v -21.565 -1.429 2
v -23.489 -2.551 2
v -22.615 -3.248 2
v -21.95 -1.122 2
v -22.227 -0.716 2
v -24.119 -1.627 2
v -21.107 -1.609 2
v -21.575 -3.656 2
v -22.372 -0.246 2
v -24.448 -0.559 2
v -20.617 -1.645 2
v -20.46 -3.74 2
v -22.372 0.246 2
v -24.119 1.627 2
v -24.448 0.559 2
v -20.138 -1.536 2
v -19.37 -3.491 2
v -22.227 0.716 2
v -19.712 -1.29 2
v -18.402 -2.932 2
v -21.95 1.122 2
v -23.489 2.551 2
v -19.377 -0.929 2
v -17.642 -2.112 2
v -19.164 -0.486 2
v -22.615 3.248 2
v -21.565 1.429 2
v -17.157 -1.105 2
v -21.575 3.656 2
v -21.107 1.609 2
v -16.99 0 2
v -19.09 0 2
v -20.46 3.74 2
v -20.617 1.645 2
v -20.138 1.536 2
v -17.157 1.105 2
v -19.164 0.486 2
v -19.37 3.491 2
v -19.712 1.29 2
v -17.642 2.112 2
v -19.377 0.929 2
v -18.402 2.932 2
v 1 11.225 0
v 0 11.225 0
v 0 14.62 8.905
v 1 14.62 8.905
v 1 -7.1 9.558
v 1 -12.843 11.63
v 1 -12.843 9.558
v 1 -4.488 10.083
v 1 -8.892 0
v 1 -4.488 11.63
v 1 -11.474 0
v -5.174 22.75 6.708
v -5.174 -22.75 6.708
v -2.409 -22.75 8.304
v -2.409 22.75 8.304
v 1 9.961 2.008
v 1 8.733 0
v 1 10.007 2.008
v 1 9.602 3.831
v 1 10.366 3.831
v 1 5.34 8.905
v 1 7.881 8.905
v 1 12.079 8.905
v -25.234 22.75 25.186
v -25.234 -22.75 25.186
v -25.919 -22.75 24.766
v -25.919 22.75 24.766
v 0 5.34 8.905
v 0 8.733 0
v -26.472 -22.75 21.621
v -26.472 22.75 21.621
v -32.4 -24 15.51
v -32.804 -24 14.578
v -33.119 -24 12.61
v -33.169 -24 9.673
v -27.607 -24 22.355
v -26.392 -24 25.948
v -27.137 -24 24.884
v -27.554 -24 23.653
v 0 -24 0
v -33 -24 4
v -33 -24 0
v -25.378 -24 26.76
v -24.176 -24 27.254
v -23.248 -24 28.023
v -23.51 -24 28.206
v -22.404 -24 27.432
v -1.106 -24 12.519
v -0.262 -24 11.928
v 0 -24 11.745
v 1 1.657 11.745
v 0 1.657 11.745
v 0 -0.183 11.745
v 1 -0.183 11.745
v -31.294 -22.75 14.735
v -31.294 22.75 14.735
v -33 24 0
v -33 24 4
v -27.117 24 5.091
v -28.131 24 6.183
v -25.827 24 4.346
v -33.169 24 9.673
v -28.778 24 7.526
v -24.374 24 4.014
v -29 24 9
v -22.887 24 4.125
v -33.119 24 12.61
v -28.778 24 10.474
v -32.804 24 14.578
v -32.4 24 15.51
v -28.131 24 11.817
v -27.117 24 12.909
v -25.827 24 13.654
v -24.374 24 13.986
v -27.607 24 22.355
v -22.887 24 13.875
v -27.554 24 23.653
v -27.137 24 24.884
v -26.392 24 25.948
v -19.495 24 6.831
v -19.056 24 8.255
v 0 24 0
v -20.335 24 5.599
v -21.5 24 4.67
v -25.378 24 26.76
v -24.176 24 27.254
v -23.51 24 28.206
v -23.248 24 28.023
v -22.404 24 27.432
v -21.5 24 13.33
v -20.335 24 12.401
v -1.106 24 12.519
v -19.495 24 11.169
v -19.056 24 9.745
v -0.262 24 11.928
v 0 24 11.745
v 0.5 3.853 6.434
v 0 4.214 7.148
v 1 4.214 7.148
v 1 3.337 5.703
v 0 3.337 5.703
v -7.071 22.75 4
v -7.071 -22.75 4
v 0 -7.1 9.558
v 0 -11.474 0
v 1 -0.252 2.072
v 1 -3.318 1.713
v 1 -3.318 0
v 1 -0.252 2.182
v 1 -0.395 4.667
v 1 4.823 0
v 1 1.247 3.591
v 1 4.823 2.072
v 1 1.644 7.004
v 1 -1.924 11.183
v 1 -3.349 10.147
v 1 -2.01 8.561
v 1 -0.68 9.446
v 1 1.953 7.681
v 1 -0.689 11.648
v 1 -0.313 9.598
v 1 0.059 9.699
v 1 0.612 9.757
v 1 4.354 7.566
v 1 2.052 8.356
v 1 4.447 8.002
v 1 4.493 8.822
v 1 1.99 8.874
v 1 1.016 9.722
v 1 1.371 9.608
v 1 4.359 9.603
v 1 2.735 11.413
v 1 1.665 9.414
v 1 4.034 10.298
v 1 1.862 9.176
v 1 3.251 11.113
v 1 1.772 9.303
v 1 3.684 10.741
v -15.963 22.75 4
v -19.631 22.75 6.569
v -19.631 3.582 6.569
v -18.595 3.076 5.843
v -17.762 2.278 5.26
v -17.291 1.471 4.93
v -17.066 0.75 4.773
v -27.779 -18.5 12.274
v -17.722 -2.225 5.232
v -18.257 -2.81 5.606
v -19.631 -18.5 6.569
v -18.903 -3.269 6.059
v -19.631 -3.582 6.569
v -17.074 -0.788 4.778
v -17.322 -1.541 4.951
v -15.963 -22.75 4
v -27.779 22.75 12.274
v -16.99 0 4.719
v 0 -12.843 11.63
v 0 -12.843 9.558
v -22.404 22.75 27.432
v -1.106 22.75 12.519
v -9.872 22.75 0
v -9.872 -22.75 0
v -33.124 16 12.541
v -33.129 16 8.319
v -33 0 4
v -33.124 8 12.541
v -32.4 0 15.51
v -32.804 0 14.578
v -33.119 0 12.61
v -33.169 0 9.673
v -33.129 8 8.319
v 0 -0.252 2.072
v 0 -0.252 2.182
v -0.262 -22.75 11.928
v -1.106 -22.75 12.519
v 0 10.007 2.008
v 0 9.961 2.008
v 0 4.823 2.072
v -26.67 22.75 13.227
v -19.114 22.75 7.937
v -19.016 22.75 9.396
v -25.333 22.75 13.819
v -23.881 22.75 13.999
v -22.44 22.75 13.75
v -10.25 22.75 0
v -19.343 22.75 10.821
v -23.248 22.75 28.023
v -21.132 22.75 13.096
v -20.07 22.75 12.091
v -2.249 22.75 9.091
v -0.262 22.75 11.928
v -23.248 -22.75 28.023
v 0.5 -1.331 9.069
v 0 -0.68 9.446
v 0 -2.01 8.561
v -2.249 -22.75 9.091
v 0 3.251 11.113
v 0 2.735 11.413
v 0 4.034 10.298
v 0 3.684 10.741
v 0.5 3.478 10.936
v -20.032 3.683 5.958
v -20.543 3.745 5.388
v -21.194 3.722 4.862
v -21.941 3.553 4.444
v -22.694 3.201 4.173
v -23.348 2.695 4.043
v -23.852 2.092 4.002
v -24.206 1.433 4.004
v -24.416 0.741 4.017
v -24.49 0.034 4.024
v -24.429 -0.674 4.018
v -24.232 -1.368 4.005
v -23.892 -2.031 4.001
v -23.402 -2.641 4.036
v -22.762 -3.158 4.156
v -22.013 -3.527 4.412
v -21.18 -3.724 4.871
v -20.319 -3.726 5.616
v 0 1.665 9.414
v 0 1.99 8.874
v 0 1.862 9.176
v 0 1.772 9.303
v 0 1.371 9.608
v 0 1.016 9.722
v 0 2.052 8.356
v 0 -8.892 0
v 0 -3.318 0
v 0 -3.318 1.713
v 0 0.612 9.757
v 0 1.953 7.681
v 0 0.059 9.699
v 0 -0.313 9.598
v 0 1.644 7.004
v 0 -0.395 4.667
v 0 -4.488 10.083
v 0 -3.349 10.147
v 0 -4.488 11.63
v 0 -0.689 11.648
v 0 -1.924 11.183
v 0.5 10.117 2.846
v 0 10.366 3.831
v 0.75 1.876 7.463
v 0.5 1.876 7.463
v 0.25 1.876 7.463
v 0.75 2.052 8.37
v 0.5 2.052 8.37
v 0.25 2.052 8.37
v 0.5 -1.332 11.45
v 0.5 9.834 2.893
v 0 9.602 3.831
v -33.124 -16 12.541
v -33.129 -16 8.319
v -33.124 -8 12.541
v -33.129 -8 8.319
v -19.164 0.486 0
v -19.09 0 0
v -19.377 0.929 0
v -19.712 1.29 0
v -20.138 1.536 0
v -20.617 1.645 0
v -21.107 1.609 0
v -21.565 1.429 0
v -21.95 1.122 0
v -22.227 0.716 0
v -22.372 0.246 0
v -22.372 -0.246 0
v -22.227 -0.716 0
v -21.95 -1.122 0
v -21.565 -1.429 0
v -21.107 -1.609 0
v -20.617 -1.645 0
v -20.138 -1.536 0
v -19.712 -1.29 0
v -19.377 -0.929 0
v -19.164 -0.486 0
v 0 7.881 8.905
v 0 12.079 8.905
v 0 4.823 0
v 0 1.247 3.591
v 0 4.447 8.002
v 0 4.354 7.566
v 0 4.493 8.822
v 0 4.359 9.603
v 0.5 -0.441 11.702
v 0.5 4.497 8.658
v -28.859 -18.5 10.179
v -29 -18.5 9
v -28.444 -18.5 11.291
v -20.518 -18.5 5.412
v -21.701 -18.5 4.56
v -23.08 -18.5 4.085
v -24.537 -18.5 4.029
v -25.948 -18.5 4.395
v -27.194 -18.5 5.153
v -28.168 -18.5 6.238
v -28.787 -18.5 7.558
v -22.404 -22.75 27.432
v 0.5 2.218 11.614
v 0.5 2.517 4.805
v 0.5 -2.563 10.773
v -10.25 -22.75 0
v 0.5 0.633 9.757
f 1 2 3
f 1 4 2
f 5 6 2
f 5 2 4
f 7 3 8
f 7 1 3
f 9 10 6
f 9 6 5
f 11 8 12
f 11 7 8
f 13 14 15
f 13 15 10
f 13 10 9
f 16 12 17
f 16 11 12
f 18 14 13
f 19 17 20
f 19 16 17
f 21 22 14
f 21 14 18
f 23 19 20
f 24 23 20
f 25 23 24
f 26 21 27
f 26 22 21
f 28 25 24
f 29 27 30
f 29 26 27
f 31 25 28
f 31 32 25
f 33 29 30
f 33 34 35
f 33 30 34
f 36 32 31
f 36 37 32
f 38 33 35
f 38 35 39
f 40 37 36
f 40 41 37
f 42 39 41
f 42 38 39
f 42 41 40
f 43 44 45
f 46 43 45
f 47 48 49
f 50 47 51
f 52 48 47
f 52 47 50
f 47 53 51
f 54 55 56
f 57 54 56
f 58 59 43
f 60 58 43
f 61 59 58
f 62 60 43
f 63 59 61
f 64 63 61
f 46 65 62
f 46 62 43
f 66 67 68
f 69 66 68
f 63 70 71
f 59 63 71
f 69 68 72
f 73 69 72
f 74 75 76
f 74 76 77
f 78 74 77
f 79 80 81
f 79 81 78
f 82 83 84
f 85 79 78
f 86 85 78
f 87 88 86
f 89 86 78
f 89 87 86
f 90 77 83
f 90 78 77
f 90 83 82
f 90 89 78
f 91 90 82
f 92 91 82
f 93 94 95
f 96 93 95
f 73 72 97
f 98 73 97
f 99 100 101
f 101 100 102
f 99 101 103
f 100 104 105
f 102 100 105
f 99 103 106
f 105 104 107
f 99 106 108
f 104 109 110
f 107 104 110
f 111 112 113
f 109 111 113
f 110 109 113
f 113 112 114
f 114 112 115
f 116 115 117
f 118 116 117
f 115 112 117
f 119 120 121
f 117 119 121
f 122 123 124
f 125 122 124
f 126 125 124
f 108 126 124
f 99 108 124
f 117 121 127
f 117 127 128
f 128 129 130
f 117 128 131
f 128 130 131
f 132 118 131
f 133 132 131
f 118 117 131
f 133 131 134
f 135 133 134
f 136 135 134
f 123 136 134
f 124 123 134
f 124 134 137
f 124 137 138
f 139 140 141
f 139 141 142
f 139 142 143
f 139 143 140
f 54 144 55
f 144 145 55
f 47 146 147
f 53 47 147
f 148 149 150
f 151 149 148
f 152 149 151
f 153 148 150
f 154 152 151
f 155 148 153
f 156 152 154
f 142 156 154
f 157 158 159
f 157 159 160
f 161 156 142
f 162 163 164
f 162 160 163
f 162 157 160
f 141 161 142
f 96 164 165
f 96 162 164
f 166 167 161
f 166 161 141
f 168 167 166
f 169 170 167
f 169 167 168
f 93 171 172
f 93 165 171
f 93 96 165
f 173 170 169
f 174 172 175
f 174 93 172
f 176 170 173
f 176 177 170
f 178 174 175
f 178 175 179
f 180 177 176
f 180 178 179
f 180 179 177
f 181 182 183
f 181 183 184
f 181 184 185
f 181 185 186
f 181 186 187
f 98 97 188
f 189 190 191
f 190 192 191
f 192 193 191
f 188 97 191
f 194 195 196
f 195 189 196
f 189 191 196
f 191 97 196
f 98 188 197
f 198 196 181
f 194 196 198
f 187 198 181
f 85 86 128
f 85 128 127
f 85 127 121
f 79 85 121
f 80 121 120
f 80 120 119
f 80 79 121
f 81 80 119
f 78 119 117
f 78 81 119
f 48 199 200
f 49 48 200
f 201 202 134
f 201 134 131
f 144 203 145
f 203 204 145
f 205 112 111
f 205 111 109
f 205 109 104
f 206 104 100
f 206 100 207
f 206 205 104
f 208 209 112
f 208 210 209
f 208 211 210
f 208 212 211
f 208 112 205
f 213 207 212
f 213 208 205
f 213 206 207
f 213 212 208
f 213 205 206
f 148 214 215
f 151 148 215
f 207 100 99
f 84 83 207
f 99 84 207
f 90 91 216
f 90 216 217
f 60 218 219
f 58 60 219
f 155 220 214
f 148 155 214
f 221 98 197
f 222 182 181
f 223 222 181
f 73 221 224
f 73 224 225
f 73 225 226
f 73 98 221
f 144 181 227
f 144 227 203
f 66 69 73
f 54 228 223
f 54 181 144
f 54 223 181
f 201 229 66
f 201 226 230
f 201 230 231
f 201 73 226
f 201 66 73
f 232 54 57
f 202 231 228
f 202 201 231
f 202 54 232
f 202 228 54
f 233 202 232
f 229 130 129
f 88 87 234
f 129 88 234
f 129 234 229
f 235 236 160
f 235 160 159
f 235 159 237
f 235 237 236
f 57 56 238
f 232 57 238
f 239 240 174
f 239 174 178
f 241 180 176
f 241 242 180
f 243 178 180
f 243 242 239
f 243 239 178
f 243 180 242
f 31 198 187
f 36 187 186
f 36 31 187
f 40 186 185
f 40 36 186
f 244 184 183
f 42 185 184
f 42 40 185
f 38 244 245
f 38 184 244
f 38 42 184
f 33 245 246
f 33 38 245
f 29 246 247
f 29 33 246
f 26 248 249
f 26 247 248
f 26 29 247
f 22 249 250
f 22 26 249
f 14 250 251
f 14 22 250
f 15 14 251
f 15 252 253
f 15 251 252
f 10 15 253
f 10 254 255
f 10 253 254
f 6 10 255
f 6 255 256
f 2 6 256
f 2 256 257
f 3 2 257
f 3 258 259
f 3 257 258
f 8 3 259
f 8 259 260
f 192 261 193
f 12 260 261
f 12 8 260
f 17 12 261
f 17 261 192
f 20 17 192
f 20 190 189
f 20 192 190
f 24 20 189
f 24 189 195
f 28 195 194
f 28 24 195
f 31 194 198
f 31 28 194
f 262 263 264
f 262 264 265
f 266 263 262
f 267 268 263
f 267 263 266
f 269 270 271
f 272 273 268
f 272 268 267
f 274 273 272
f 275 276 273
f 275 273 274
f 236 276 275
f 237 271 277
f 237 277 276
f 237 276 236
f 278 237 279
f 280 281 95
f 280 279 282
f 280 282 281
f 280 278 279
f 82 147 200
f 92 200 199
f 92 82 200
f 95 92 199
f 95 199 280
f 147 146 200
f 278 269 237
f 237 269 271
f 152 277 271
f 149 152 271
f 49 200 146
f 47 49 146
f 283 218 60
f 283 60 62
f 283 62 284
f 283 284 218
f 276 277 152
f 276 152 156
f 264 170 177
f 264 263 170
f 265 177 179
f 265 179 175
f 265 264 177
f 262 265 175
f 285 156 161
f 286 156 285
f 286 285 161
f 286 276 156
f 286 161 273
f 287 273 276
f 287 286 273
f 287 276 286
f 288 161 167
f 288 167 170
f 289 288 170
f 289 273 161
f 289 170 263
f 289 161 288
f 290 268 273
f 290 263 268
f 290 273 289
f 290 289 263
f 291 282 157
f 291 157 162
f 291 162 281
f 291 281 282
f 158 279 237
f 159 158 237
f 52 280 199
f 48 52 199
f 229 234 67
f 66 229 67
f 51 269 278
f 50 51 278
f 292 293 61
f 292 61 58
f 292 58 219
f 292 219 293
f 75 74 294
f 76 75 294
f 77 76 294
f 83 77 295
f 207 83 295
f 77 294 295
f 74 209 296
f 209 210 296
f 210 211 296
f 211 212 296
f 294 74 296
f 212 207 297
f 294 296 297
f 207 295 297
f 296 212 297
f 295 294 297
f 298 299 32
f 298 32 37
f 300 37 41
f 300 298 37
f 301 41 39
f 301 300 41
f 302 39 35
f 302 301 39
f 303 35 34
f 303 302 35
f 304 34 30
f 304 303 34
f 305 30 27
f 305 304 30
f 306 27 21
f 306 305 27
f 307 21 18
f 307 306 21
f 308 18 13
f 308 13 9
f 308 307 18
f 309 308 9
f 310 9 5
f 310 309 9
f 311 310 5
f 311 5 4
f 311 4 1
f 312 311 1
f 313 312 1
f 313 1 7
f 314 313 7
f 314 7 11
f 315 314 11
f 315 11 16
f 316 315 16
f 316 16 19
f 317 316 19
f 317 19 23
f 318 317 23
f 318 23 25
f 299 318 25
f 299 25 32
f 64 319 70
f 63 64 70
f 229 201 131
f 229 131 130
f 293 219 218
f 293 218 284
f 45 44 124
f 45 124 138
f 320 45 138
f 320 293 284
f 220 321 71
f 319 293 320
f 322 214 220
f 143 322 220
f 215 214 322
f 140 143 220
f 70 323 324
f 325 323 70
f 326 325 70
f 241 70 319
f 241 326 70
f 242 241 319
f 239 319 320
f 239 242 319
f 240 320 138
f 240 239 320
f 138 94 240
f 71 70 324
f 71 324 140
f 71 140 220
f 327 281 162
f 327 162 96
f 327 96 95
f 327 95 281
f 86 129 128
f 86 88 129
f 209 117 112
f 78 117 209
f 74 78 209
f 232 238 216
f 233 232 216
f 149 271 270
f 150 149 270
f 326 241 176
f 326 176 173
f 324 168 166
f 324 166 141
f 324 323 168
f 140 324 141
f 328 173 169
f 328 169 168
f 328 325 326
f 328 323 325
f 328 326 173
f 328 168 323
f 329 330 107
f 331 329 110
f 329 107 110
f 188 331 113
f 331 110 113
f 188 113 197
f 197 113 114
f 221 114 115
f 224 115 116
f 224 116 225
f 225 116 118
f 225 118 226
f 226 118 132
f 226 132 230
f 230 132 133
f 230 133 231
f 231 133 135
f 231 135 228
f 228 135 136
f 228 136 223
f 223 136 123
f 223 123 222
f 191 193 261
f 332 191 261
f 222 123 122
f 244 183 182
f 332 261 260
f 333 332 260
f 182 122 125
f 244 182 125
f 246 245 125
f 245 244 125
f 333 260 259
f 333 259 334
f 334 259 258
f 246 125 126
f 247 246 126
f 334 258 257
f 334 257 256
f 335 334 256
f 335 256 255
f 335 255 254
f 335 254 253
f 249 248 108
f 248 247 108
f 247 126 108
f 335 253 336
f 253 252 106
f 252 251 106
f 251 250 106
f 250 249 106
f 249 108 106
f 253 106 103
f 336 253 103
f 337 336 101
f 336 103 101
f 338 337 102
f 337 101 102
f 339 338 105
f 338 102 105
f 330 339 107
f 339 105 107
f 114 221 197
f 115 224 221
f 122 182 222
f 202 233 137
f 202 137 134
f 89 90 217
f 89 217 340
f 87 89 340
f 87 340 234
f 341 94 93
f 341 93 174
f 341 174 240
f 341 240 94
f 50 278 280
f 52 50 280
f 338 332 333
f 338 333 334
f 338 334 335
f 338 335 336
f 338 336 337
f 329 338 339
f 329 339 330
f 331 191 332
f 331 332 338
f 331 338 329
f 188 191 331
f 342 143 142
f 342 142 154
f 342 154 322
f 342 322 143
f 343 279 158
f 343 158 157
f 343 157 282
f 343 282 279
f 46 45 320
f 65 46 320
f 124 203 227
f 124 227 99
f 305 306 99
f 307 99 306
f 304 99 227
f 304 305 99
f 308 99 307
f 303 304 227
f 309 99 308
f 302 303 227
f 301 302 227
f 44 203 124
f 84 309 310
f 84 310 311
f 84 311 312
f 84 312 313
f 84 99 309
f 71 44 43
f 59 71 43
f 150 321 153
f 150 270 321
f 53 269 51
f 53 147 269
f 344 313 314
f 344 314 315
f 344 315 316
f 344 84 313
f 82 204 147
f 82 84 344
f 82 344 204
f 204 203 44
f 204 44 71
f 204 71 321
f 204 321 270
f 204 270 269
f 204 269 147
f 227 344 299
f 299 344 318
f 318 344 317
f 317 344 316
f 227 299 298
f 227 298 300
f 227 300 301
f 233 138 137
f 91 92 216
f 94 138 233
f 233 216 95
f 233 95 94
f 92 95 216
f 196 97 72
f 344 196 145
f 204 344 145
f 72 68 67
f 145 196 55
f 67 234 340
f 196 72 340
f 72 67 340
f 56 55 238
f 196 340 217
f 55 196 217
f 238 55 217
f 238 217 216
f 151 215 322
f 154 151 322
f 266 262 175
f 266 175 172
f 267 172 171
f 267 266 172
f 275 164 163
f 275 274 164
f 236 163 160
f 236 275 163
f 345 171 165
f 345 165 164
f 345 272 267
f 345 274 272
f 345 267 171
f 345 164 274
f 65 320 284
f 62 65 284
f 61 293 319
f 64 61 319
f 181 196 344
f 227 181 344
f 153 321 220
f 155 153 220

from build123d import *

# Parameters (mm, degrees)
F1_DEPTH = 24
F2_DEPTH = 22.75
F3_R     = 5
F4_DEPTH = 42.5
F5_R     = 1.65
F6_DEPTH = 25
F7_START = 2
F5_R_2   = 3.75
F7_DEPTH = 23
F9_DEPTH = 1


with BuildPart() as f1:
    # F0 (on Front) → F1 (new body, symmetric)
    with BuildSketch(Plane.XZ):
        with BuildLine():
            ThreePointArc((-24.1761827572, 27.2544863717), (-26.8028128996, 25.4428226271), (-27.6068595339, 22.3549721713))
            Line((-27.6068595339, 22.3549721713), (-25.9186847038, 24.76593569))
            Line((-25.9186847038, 24.76593569), (-24.1761827572, 27.2544863717))
        make_face()
        with BuildLine():
            Line((-33, 4), (-15.9628038305, 4))
            Line((-15.9628038305, 4), (-31.2942431747, 14.7351894004))
            Line((-31.2942431747, 14.7351894004), (-32.4000984345, 15.5095175895))
            add(Edge.make_bspline(
                [(-32.4000984345, 15.5095175895), (-33.6793400347, 13.5531779379), (-33, 7.9824011773), (-33, 4)],
                knots=[0, 0, 0, 0, 11.5251410851, 11.5251410851, 11.5251410851, 11.5251410851], degree=3))
        make_face()
        Polygon((-33, 0), (-10.2502118035, 0), (-15.9628038305, 4), (-33, 4), align=None)
        Polygon((-9.8717945621, 0), (0, 0), (0, 4), (-7.0709644092, 4), align=None)
        Polygon((-1.1058552598, 12.5190587418), (-1.7330256341, 11.6233666218), (-2.2487850863, 9.0910355887), (-0.2621286542, 11.9282750123), align=None)
        Polygon((-7.0709644092, 4), (0, 4), (0, 7.8723652764), (0, 11.7447305527), (-0.2621286542, 11.9282750123), (-2.2487850863, 9.0910355887), (-2.4090210327, 8.3042919667), (-5.1744842522, 6.7084543561), align=None)
        Polygon((-15.9628038305, 4), (-7.0709644092, 4), (-5.1744842522, 6.7084543561), (-1.7330256341, 11.6233666218), (-1.1058552598, 12.5190587418), (-22.4038084113, 27.4320460869), (-23.0309787856, 26.5363539669), (-26.4724374037, 21.6214417012), (-31.2942431747, 14.7351894004), align=None)
        Polygon((-1.7330256341, 11.6233666218), (-5.1744842522, 6.7084543561), (-2.4090210327, 8.3042919667), (-2.2487850863, 9.0910355887), align=None)
        Polygon((-10.2502118035, 0), (-9.8717945621, 0), (-7.0709644092, 4), (-15.9628038305, 4), align=None)
        Polygon((-25.9186847038, 24.76593569), (-26.4724374037, 21.6214417012), (-23.0309787856, 26.5363539669), (-25.2341914491, 25.1855903927), align=None)
        Polygon((-32.4000984345, 15.5095175895), (-31.2942431747, 14.7351894004), (-26.4724374037, 21.6214417012), (-25.9186847038, 24.76593569), (-27.6068595339, 22.3549721713), align=None)
        Polygon((-24.1761827572, 27.2544863717), (-25.9186847038, 24.76593569), (-25.2341914491, 25.1855903927), (-23.2475350169, 28.0228298164), (-23.5096636711, 28.206374276), align=None)
        Polygon((-25.2341914491, 25.1855903927), (-23.0309787856, 26.5363539669), (-22.4038084113, 27.4320460869), (-23.2475350169, 28.0228298164), align=None)
    extrude(amount=F1_DEPTH, both=True)

    # F0 (on Front) → F2 (cut, symmetric)
    with BuildSketch(Plane.XZ):
        Polygon((-15.9628038305, 4), (-7.0709644092, 4), (-5.1744842522, 6.7084543561), (-1.7330256341, 11.6233666218), (-1.1058552598, 12.5190587418), (-22.4038084113, 27.4320460869), (-23.0309787856, 26.5363539669), (-26.4724374037, 21.6214417012), (-31.2942431747, 14.7351894004), align=None)
        Polygon((-25.9186847038, 24.76593569), (-26.4724374037, 21.6214417012), (-23.0309787856, 26.5363539669), (-25.2341914491, 25.1855903927), align=None)
        Polygon((-1.7330256341, 11.6233666218), (-5.1744842522, 6.7084543561), (-2.4090210327, 8.3042919667), (-2.2487850863, 9.0910355887), align=None)
        Polygon((-10.2502118035, 0), (-9.8717945621, 0), (-7.0709644092, 4), (-15.9628038305, 4), align=None)
        Polygon((-25.2341914491, 25.1855903927), (-23.0309787856, 26.5363539669), (-22.4038084113, 27.4320460869), (-23.2475350169, 28.0228298164), align=None)
        Polygon((-1.1058552598, 12.5190587418), (-1.7330256341, 11.6233666218), (-2.2487850863, 9.0910355887), (-0.2621286542, 11.9282750123), align=None)
    extrude(amount=F2_DEPTH, both=True, mode=Mode.SUBTRACT)

    # F3 (on face) → F4 (cut)
    with BuildSketch(Plane(origin=(0, 24, 0), x_dir=(-1, 0, 0), z_dir=(0, 1, 0))):
        with Locations((24, 9)):
            Circle(F3_R)
    extrude(amount=-F4_DEPTH, mode=Mode.SUBTRACT)

    # F5 (on Top) → F6 (cut)
    with BuildSketch(Plane.XY):
        with Locations((-20.7403171808, 0)):
            Circle(F5_R)
    extrude(amount=F6_DEPTH, mode=Mode.SUBTRACT)

    # F5 (on Top) → F7 (cut)
    with BuildSketch(Plane.XY.offset(F7_START)):
        with Locations((-20.7403171808, 0)):
            Circle(F5_R_2)
        with Locations((-20.7403171808, 0)):
            Circle(F5_R, mode=Mode.SUBTRACT)
    extrude(amount=F7_DEPTH, mode=Mode.SUBTRACT)

    # F8 (on face) → F9 (join)
    with BuildSketch(Plane.YZ):
        Polygon((-7.1003163303, 9.557886192), (-11.4740050518, 0), (-8.8921013951, 0), (-4.4878274378, 10.0829327401), (-4.4878274378, 11.6300359184), (-12.8426943545, 11.6300359184), (-12.8426943545, 9.557886192), align=None)
        with BuildLine():
            Line((-3.3179421679, 1.7127732056), (-3.3179421679, 0))
            Line((-3.3179421679, 0), (4.822828098, 0))
            Line((4.822828098, 0), (4.822828098, 2.0721497264))
            Line((4.822828098, 2.0721497264), (-0.2517722775, 2.0721497264))
            Line((-0.2517722775, 2.0721497264), (-0.2517722775, 2.1817468214))
            Line((-0.2517722775, 2.1817468214), (1.2469042774, 3.5912164385))
            add(Edge.make_bspline(
                [(3.3368953913, 5.7028720946), (2.7430320626, 4.9624545109), (1.2469042774, 3.5912164385)],
                knots=[0, 0, 0, 1, 1, 1], degree=2))
            add(Edge.make_bspline(
                [(4.2136721514, 7.1480244868), (3.9307587201, 6.4432896782), (3.3368953913, 5.7028720946)],
                knots=[0, 0, 0, 1, 1, 1], degree=2))
            add(Edge.make_bspline(
                [(4.4965855826, 8.6581705051), (4.4965855826, 7.8527592953), (4.2136721514, 7.1480244868)],
                knots=[0, 0, 0, 1, 1, 1], degree=2))
            add(Edge.make_bspline(
                [(4.0339838909, 10.2983037757), (4.4965855826, 9.5808251188), (4.4965855826, 8.6581705051)],
                knots=[0, 0, 0, 1, 1, 1], degree=2))
            add(Edge.make_bspline(
                [(2.7353857537, 11.4133904981), (3.5713821992, 11.0157824325), (4.0339838909, 10.2983037757)],
                knots=[0, 0, 0, 1, 1, 1], degree=2))
            add(Edge.make_bspline(
                [(1.6567308132, 11.7447305527), (2.2406834278, 11.6486757506), (2.7353857537, 11.4133904981)],
                knots=[0.4082482905, 0.4082482905, 0.4082482905, 1, 1, 1], degree=2))
            Line((1.6567308132, 11.7447305527), (-0.1827126259, 11.7447305527))
            add(Edge.make_bspline(
                [(-0.6888862727, 11.647877306), (-0.4462729111, 11.7070287542), (-0.1827126259, 11.7447305527)],
                knots=[0, 0, 0, 0.3626225608, 0.3626225608, 0.3626225608], degree=2))
            add(Edge.make_bspline(
                [(-1.9237651687, 11.1827268446), (-1.3579383062, 11.4847560483), (-0.6888862727, 11.647877306)],
                knots=[0, 0, 0, 1, 1, 1], degree=2))
            add(Edge.make_bspline(
                [(-3.3485274038, 10.1466519814), (-2.4895920313, 10.880697641), (-1.9237651687, 11.1827268446)],
                knots=[0, 0, 0, 1, 1, 1], degree=2))
            Line((-3.3485274038, 10.1466519814), (-2.0104233369, 8.5613172584))
            add(Edge.make_bspline(
                [(-0.6799655789, 9.4457403273), (-1.3171579917, 9.1347904299), (-2.0104233369, 8.5613172584)],
                knots=[0, 0, 0, 1, 1, 1], degree=2))
            add(Edge.make_bspline(
                [(0.6326507914, 9.7566902248), (-0.0427731661, 9.7566902248), (-0.6799655789, 9.4457403273)],
                knots=[0, 0, 0, 1, 1, 1], degree=2))
            add(Edge.make_bspline(
                [(1.6649025002, 9.4138807067), (1.2774895132, 9.7566902248), (0.6326507914, 9.7566902248)],
                knots=[0, 0, 0, 1, 1, 1], degree=2))
            add(Edge.make_bspline(
                [(2.0523154871, 8.3701595345), (2.0523154871, 9.0710711886), (1.6649025002, 9.4138807067)],
                knots=[0, 0, 0, 1, 1, 1], degree=2))
            add(Edge.make_bspline(
                [(1.8764503812, 7.4627975387), (2.0523154871, 7.9011859187), (2.0523154871, 8.3701595345)],
                knots=[0, 0, 0, 1, 1, 1], degree=2))
            add(Edge.make_bspline(
                [(1.3029772097, 6.510832074), (1.7005852753, 7.0244091587), (1.8764503812, 7.4627975387)],
                knots=[0, 0, 0, 1, 1, 1], degree=2))
            add(Edge.make_bspline(
                [(-0.394503378, 4.6667972313), (0.9053691441, 5.9972549893), (1.3029772097, 6.510832074)],
                knots=[0, 0, 0, 1, 1, 1], degree=2))
            Line((-0.394503378, 4.6667972313), (-3.3179421679, 1.7127732056))
        make_face()
        with BuildLine():
            Line((5.3402283372, 8.9054011613), (8.7326407429, 0))
            Line((8.7326407429, 0), (11.2253374618, 0))
            Line((11.2253374618, 0), (14.6202986372, 8.9054011613))
            Line((14.6202986372, 8.9054011613), (12.0791752949, 8.9054011613))
            Line((12.0791752949, 8.9054011613), (10.3664020893, 3.8308007857))
            add(Edge.make_bspline(
                [(10.0070255685, 2.0084304851), (10.0478058829, 2.7730613805), (10.3664020893, 3.8308007857)],
                knots=[0, 0, 0, 1, 1, 1], degree=2))
            Line((10.0070255685, 2.0084304851), (9.9611477148, 2.0084304851))
            add(Edge.make_bspline(
                [(9.601771194, 3.8308007857), (9.8872333949, 2.8673658576), (9.9611477148, 2.0084304851)],
                knots=[0, 0, 0, 1, 1, 1], degree=2))
            Line((9.601771194, 3.8308007857), (7.8813516794, 8.9054011613))
            Line((7.8813516794, 8.9054011613), (5.3402283372, 8.9054011613))
        make_face()
    extrude(amount=F9_DEPTH)


solid = f1.part
